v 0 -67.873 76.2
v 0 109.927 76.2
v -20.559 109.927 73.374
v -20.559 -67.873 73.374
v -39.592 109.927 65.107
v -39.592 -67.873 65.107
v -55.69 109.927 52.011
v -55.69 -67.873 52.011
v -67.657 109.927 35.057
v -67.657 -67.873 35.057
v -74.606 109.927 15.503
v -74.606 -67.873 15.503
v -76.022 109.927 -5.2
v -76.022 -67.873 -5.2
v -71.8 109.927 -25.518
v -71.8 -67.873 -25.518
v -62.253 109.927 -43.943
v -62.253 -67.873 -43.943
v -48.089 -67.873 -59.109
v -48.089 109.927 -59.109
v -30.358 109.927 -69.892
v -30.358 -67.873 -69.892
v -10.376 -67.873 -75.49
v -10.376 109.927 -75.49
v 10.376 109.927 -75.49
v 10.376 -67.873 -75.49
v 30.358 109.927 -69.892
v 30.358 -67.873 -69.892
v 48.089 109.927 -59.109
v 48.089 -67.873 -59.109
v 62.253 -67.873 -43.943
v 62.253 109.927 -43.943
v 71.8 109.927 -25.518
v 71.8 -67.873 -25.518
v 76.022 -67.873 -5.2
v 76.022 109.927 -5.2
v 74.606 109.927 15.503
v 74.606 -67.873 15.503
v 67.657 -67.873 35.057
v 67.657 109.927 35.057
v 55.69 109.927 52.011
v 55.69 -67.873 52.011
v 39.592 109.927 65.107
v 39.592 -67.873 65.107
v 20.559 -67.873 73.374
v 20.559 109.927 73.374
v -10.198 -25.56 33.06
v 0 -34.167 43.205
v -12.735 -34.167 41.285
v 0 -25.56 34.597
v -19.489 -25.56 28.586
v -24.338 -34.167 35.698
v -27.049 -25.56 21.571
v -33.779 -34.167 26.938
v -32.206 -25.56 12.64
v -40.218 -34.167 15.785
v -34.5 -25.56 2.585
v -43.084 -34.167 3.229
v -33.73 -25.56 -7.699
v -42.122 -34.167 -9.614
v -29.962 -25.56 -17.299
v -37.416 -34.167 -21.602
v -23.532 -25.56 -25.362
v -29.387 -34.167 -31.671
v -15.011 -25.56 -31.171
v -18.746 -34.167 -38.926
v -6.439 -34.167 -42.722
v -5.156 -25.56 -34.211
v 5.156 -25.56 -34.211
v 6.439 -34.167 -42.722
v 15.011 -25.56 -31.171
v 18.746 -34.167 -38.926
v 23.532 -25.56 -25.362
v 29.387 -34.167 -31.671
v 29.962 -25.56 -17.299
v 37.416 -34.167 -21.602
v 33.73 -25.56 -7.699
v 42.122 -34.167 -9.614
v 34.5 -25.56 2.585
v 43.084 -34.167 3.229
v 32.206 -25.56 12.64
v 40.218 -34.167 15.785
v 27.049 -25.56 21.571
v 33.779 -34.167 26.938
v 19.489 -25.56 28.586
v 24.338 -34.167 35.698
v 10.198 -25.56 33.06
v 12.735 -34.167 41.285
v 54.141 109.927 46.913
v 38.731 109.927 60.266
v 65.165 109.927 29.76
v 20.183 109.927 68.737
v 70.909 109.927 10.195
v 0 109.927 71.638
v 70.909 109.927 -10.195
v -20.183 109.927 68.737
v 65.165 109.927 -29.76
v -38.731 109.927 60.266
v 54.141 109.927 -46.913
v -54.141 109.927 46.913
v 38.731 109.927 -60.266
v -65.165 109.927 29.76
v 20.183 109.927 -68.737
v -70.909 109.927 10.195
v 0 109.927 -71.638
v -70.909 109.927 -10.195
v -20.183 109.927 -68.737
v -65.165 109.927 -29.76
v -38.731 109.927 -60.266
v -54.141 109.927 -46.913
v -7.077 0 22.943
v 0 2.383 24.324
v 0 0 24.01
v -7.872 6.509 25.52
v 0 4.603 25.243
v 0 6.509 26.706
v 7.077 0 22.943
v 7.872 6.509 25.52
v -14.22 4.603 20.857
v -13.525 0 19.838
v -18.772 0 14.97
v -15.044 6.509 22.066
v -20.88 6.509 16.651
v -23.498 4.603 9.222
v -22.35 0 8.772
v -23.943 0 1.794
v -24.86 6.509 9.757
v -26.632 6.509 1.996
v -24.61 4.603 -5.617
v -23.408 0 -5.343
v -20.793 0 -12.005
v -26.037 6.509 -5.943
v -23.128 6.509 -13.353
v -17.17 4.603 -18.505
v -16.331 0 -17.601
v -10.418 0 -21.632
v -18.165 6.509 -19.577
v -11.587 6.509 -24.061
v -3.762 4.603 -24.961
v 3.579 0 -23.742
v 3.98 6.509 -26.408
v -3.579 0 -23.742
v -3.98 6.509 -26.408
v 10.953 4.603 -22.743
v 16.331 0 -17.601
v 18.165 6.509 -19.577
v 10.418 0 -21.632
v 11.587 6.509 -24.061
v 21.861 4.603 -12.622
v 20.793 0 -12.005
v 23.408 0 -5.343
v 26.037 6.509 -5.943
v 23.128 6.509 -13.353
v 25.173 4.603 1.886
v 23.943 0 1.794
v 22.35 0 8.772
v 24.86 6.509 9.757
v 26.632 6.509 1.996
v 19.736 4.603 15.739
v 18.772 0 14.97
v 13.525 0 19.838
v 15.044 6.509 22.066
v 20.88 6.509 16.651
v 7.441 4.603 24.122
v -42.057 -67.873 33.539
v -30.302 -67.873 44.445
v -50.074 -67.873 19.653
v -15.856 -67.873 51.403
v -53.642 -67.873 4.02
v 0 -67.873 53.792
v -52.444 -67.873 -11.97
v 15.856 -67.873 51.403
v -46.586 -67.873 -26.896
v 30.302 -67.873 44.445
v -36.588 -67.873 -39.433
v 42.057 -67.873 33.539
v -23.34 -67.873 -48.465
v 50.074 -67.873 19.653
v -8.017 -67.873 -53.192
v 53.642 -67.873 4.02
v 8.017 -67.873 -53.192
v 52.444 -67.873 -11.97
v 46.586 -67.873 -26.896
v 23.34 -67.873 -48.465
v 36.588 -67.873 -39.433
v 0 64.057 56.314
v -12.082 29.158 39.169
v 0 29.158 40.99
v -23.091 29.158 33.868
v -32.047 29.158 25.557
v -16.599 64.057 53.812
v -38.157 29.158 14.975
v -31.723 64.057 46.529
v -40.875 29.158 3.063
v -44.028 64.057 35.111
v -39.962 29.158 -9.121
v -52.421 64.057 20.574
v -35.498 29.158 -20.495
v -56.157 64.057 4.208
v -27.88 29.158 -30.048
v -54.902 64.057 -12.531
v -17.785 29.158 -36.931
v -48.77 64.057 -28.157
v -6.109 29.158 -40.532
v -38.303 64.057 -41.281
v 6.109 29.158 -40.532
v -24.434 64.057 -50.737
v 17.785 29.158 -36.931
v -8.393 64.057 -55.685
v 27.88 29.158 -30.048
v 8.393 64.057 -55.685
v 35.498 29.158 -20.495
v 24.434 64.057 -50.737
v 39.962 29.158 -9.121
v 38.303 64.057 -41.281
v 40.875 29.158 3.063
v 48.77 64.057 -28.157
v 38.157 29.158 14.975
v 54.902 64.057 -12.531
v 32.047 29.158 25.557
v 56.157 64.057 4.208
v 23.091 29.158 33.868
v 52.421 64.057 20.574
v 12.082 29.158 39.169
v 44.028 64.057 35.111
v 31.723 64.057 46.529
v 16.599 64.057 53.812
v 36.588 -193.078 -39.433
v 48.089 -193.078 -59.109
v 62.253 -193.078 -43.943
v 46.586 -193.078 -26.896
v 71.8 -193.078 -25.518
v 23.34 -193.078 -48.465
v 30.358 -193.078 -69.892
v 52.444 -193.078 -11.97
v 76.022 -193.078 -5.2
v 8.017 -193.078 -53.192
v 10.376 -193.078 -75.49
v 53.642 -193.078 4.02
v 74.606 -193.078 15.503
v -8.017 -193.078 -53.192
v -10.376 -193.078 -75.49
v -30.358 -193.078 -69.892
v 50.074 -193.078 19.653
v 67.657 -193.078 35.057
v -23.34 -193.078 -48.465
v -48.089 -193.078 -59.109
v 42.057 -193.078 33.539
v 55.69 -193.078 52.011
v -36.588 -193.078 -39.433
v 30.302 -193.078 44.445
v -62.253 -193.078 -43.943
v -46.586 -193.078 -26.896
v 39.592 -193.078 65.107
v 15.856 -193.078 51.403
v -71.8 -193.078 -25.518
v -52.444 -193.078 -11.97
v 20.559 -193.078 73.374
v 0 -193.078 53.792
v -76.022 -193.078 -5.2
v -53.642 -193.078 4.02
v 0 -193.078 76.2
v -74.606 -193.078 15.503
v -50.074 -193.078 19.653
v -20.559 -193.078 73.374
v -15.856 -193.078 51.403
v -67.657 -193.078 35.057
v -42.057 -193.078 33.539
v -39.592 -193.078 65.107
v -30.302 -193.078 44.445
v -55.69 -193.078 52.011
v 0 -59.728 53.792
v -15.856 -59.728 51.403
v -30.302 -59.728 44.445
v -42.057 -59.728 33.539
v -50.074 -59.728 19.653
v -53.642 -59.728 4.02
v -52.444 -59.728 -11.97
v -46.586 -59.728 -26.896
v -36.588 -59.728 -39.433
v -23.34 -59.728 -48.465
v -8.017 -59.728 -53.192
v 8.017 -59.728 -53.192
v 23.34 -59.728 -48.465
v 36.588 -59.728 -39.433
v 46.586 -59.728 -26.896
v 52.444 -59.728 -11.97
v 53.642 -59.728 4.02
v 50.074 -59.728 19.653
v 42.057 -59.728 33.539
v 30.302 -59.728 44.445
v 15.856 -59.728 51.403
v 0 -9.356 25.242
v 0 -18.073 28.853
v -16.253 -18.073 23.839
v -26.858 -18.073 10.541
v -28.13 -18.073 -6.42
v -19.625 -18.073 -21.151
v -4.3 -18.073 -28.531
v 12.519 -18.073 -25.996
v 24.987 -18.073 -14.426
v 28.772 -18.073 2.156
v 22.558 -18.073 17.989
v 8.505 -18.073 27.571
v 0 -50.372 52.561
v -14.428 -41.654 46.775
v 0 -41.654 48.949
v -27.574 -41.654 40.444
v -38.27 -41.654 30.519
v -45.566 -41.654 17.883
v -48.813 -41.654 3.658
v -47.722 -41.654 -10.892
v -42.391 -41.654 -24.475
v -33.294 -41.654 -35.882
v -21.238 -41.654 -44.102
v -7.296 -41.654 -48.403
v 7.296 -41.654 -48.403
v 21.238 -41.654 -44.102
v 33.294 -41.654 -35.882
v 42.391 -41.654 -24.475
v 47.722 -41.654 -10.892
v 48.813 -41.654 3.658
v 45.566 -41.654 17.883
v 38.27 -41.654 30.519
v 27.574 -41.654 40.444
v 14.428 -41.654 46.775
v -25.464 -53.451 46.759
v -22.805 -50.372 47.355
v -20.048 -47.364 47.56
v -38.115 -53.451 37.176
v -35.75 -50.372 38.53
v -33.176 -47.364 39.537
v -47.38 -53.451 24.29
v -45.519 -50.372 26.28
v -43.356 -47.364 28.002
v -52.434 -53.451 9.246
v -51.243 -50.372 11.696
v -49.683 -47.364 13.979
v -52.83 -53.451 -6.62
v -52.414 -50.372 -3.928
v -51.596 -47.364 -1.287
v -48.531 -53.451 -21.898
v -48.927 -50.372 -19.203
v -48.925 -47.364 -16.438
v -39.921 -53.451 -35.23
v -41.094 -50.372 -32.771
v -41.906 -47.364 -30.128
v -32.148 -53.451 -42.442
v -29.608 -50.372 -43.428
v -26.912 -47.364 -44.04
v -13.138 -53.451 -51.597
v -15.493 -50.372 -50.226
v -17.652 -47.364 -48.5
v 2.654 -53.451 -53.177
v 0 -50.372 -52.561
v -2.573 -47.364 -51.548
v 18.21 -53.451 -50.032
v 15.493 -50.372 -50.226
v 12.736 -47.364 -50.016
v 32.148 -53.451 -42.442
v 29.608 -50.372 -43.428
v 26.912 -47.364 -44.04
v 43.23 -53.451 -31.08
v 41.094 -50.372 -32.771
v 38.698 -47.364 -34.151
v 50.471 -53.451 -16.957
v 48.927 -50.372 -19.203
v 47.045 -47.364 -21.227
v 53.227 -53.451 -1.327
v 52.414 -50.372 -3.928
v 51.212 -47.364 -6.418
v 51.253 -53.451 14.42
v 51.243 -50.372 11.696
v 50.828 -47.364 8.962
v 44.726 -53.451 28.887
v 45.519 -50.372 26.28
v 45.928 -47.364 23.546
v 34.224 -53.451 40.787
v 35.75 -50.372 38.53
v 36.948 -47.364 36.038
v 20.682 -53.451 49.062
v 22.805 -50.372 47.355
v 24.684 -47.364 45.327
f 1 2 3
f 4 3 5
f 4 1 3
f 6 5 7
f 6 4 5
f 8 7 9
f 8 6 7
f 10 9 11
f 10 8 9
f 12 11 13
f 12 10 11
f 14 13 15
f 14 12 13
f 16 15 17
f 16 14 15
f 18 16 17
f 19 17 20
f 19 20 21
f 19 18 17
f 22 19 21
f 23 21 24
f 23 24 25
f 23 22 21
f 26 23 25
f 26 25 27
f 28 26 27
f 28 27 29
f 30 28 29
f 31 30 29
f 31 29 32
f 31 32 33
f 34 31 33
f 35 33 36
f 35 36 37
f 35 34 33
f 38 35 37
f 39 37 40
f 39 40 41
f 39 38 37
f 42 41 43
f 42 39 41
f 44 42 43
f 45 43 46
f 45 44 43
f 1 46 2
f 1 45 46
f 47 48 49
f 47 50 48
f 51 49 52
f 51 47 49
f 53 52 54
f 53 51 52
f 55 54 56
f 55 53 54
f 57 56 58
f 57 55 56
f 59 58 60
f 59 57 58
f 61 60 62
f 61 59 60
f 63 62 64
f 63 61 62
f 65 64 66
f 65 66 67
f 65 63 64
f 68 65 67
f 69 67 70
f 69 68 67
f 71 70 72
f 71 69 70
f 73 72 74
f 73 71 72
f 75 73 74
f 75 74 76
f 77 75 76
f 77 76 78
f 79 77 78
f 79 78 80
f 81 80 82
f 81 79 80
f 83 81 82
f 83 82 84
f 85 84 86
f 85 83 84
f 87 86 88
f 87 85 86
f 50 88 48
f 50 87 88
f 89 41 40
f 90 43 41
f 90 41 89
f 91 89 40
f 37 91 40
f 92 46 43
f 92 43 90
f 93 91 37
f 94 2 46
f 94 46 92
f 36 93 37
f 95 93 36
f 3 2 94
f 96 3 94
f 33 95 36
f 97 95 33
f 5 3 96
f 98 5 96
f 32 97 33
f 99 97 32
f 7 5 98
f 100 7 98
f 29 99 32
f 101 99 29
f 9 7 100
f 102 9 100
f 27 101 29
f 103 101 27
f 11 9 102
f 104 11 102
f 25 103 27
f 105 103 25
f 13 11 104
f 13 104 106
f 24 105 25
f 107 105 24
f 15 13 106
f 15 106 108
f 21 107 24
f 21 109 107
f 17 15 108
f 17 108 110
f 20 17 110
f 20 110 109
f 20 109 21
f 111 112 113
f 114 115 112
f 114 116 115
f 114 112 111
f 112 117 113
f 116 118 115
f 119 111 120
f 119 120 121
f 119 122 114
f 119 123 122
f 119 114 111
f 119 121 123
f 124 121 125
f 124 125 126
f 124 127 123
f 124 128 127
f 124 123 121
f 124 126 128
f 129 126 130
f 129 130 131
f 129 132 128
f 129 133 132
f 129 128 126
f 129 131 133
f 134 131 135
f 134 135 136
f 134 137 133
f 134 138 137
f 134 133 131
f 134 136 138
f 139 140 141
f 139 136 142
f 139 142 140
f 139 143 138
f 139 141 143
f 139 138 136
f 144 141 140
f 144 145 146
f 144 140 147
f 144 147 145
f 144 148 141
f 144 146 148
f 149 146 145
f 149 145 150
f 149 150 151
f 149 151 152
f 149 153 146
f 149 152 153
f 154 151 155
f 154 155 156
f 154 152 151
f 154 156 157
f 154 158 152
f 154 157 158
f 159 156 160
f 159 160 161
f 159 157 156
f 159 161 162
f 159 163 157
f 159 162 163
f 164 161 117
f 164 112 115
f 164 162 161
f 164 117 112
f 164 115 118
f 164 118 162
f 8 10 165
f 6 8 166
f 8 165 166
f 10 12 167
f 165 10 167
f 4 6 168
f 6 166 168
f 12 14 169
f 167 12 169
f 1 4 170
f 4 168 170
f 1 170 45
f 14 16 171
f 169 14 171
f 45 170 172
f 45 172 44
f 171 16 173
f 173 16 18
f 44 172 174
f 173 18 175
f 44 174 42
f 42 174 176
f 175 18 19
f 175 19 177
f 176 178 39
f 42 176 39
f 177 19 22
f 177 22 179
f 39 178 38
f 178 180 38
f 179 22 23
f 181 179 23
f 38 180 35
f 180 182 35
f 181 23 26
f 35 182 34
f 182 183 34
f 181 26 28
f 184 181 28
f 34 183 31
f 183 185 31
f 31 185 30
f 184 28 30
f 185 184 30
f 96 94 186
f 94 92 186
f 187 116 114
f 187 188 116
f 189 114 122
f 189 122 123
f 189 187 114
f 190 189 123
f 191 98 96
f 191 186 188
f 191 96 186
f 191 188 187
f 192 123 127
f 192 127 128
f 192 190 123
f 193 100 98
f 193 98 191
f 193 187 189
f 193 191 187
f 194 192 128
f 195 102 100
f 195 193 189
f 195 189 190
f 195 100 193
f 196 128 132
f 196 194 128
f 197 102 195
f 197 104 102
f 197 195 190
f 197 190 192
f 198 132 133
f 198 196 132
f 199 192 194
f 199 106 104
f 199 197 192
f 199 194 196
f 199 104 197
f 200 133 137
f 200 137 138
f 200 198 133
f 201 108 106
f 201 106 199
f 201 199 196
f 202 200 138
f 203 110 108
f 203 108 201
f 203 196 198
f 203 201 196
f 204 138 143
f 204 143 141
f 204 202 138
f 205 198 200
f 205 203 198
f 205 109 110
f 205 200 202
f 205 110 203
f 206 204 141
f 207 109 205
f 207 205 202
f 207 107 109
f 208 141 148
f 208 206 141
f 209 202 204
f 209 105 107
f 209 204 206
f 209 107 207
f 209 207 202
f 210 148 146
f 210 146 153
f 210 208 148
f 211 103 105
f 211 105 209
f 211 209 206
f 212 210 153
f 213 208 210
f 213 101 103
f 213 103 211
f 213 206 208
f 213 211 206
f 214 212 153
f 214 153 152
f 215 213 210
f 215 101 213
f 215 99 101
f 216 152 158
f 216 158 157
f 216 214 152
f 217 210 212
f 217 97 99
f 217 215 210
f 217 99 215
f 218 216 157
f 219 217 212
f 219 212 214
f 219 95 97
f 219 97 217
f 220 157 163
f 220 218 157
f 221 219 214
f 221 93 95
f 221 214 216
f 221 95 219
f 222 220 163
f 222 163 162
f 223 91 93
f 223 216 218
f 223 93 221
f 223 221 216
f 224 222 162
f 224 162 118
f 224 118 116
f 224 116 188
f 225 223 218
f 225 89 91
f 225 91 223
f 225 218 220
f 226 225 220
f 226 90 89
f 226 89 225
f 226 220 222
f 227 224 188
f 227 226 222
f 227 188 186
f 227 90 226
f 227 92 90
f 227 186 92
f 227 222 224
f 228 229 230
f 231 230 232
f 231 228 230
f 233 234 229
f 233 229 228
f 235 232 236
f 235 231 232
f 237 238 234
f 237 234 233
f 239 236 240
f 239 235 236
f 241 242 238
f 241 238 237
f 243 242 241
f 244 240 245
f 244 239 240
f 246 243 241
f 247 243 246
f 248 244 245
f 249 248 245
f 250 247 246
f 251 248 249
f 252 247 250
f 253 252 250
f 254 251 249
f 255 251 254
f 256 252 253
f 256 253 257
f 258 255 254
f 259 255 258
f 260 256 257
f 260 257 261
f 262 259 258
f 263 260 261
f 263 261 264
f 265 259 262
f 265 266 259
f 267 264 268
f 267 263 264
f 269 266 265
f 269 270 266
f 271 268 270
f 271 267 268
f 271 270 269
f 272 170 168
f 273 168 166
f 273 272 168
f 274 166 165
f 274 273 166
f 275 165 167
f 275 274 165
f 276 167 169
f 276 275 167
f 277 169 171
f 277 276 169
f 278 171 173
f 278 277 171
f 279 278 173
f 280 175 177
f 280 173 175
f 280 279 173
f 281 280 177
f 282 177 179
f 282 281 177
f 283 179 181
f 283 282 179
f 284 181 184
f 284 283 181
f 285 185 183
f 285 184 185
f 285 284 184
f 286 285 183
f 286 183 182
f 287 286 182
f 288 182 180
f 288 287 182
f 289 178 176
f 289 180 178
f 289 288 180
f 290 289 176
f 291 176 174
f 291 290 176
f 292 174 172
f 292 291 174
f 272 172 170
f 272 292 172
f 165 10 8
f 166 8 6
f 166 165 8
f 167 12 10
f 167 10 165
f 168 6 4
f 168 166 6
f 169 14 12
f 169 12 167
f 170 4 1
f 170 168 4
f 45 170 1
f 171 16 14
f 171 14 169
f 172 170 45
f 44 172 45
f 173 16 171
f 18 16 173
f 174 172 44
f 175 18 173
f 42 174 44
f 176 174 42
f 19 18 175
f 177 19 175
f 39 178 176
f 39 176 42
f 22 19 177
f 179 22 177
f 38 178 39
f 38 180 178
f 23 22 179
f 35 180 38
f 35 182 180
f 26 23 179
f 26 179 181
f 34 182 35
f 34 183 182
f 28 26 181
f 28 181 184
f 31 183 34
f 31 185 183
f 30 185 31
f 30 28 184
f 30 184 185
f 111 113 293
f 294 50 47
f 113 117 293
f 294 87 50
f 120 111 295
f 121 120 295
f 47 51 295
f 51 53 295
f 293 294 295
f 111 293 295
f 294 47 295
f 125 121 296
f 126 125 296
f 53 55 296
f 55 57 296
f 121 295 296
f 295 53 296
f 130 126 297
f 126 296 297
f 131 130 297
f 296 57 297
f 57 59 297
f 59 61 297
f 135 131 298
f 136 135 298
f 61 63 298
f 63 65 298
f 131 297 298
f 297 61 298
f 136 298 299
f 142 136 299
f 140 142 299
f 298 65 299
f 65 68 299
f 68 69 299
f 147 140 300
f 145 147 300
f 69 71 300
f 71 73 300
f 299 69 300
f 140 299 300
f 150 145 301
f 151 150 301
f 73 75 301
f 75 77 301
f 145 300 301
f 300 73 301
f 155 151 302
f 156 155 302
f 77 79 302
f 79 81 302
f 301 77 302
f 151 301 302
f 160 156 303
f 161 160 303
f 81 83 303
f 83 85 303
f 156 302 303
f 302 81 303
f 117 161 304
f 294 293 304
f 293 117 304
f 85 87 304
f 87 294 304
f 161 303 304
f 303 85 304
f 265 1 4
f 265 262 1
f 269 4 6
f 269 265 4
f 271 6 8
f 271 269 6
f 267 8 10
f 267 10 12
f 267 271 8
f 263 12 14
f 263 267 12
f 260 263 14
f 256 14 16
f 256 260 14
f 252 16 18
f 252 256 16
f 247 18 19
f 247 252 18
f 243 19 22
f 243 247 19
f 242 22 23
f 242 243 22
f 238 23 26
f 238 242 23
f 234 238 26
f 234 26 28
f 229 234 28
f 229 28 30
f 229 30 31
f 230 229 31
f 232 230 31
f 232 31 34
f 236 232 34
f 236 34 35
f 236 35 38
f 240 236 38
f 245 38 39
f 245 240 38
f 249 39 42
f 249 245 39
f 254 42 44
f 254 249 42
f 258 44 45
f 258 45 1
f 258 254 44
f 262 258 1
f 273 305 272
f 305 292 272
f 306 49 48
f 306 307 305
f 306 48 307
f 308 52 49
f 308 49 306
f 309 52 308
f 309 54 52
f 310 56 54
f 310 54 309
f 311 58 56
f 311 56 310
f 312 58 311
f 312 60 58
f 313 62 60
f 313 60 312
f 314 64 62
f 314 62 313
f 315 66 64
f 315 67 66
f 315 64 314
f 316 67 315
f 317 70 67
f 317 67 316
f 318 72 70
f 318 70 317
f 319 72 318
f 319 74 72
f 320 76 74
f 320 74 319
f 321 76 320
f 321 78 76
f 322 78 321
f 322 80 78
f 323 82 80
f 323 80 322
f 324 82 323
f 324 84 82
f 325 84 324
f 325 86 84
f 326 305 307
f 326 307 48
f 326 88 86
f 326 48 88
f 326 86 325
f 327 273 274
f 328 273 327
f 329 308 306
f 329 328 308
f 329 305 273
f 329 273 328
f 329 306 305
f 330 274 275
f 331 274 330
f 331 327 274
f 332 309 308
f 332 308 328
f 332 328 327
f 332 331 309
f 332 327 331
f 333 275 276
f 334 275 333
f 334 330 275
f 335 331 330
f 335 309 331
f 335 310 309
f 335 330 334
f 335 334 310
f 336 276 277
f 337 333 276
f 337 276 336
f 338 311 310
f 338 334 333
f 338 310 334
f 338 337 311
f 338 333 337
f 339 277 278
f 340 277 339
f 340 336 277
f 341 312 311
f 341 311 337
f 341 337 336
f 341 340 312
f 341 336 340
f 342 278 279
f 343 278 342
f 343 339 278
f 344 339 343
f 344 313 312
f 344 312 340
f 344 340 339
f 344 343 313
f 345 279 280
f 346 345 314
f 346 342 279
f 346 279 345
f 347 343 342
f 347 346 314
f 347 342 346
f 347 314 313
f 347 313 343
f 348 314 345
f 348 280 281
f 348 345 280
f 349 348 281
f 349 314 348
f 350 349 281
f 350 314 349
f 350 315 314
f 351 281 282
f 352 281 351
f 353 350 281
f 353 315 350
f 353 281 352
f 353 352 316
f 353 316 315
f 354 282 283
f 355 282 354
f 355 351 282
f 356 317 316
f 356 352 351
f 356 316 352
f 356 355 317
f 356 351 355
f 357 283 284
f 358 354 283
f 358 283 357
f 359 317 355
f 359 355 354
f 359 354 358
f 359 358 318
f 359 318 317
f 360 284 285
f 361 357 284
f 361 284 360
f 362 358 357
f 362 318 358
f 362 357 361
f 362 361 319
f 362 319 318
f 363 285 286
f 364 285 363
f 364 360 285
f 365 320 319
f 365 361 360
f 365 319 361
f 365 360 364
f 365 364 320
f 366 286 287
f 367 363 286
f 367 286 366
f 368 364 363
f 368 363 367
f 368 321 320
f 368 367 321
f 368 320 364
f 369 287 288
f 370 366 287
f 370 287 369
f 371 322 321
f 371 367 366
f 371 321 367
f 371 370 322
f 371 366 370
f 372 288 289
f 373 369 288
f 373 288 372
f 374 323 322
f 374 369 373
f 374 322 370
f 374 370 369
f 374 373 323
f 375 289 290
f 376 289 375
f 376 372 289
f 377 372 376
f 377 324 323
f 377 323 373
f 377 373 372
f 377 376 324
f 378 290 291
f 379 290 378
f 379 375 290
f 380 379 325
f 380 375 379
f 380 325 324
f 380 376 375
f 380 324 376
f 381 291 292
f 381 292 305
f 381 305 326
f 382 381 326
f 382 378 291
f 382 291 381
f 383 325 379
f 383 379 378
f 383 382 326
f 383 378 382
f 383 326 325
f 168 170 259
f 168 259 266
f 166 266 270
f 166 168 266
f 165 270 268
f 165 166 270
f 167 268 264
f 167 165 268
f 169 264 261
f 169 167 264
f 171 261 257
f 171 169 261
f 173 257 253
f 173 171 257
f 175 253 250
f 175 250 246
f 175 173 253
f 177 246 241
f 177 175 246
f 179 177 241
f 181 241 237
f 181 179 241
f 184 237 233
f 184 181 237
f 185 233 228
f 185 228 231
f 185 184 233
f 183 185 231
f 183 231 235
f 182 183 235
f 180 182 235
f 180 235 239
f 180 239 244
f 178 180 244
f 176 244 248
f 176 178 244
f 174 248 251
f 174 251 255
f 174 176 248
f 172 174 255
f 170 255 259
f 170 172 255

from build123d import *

# Parameters (mm, degrees)
SHORTEN_CHAMBER_75IN_BY = 19.05
SPLIT1_SURFACE_1_BACK   = 372.838
SPLIT1_SURFACE_1_DEPTH  = 745.676
SPLIT1_SURFACE_2_BACK   = 372.838
SPLIT1_SURFACE_2_DEPTH  = 745.676


with BuildPart() as part:
    # Sketch1 → Revolve2 (revolve)
    with BuildSketch(Plane.XY, mode=Mode.PRIVATE) as revolve2_sk:
        with BuildLine():
            Line((71.638455479, 109.927347077), (76.2, 109.927347077))
            Line((76.2, 109.927347077), (76.2, -212.127673706))
            Line((76.2, -212.127673706), (53.792460243, -212.127673706))
            Line((53.792460243, -212.127673706), (53.792460243, -59.727673706))
            add(Edge.make_bspline(
                [(53.792460243, -59.727673706), (53.79245901, -59.657143635), (53.791929865, -59.515566582), (53.78955401, -59.181725095), (53.783229407, -58.904955972), (53.773743915, -58.532727967), (53.761101012, -58.212998101), (53.741350178, -57.781754922), (53.71133783, -57.281120379), (53.667125658, -56.688158646), (53.588220976, -55.848640848), (53.488359374, -55.008326344), (53.367608286, -54.172595915), (53.197743308, -53.172585727), (53.002996658, -52.177603312), (52.777307577, -51.188699577), (52.520946667, -50.207649536), (52.240221768, -49.233238242), (51.935281153, -48.26612973), (51.544470229, -47.149295579), (51.05045274, -45.890568924), (50.509666114, -44.65112933), (49.922993271, -43.432862061), (49.291052557, -42.237253783), (48.615057538, -41.066315433), (47.895407812, -39.921133222), (47.134034414, -38.804236815), (46.430801323, -37.851612371), (45.804470188, -37.055832718), (45.263749922, -36.403541885), (44.826059182, -35.894408242), (44.425708417, -35.447153273), (44.092389725, -35.084791805), (43.784856841, -34.760500776), (43.585004621, -34.551710078), (43.355324283, -34.318676919), (43.25471536, -34.217322688), (43.204843213, -34.167450302)],
                knots=[0.082637729, 0.082637729, 0.082637729, 0.082637729, 0.082637729, 0.092574926, 0.102512123, 0.11244932, 0.122386517, 0.132323714, 0.142260911, 0.162135305, 0.182009699, 0.201884093, 0.24163288, 0.261507274, 0.281381668, 0.321130456, 0.360879243, 0.380753637, 0.400628031, 0.440376819, 0.480125606, 0.519874394, 0.559623181, 0.599371969, 0.639120757, 0.678869544, 0.718618332, 0.75836712, 0.798115907, 0.817990301, 0.837864695, 0.857739089, 0.877613483, 0.88755068, 0.897487877, 0.907425074, 0.91736227, 0.91736227, 0.91736227, 0.91736227, 0.91736227], degree=4))
            Line((43.204843213, -34.167450302), (34.597215016, -25.559822106))
            add(Edge.make_bspline(
                [(24.01, 0), (24.010001231, -0.070528647), (24.010530378, -0.21358419), (24.012906065, -0.543182916), (24.01923046, -0.824160397), (24.028715582, -1.194822072), (24.041357876, -1.513435058), (24.0571581, -1.861939603), (24.07611336, -2.193706872), (24.103750975, -2.6180694), (24.143219184, -3.122033947), (24.214231846, -3.879978675), (24.33405882, -4.886450388), (24.51041819, -6.05671076), (24.761817384, -7.385166414), (25.062727469, -8.703574513), (25.412702783, -10.009637207), (25.811293148, -11.301819595), (26.25787756, -12.578099333), (26.751935496, -13.836887481), (27.292605299, -15.076197125), (27.879411568, -16.29460979), (28.511071583, -17.489938789), (29.187464585, -18.661287751), (29.906377295, -19.80574339), (30.668954196, -20.923860067), (31.370099393, -21.874411752), (31.999668326, -22.673445472), (32.535060622, -23.320422129), (32.983187975, -23.840005007), (33.419382235, -24.329816236), (33.846758332, -24.788484379), (34.156490851, -25.113868299), (34.44779217, -25.409649035), (34.547344638, -25.509949921), (34.597215016, -25.559822106)],
                knots=[0.082637729, 0.082637729, 0.082637729, 0.082637729, 0.082637729, 0.092574926, 0.102512123, 0.11244932, 0.122386517, 0.132323714, 0.142260911, 0.152198108, 0.162135305, 0.182009699, 0.201884093, 0.24163288, 0.281381668, 0.321130456, 0.360879243, 0.400628031, 0.440376819, 0.480125606, 0.519874394, 0.559623181, 0.599371969, 0.639120757, 0.678869544, 0.718618332, 0.75836712, 0.798115907, 0.817990301, 0.837864695, 0.857739089, 0.877613483, 0.897487877, 0.907425074, 0.91736227, 0.91736227, 0.91736227, 0.91736227, 0.91736227], degree=4))
            add(Edge.make_bspline(
                [(24.01, 0), (24.010000626, 0.035892652), (24.010538457, 0.11011369), (24.012955849, 0.267641069), (24.019393694, 0.427064117), (24.031465725, 0.646764266), (24.052367213, 0.901433328), (24.086116845, 1.202537273), (24.137431431, 1.542050498), (24.201475827, 1.880996777), (24.278073727, 2.21635442), (24.367255697, 2.549239421), (24.468673539, 2.878092645), (24.582551197, 3.203347041), (24.708128897, 3.523627157), (24.846218103, 3.839666733), (24.995002427, 4.149282184), (25.156944348, 4.454783123), (25.327420631, 4.751301575), (25.513446847, 5.045703861), (25.702720396, 5.325518936), (25.9153376, 5.610727543), (26.0898085, 5.832913647), (26.277277882, 6.049951637), (26.415487374, 6.208641646), (26.581374196, 6.382121779), (26.655452387, 6.458478841), (26.706211329, 6.50923965)],
                knots=[0.082568816, 0.082568816, 0.082568816, 0.082568816, 0.082568816, 0.102426634, 0.122284453, 0.142142271, 0.162000089, 0.201715725, 0.241431362, 0.281146998, 0.320862634, 0.360578271, 0.400293907, 0.440009544, 0.47972518, 0.519440816, 0.559156453, 0.598872089, 0.638587725, 0.678303362, 0.718018998, 0.757734635, 0.797450271, 0.837165907, 0.857023726, 0.876881544, 0.91659718, 0.91659718, 0.91659718, 0.91659718, 0.91659718], degree=4))
            add(Edge.make_bspline(
                [(26.706211329, 6.50923965), (49.172333461, 34.635954224), (71.638455479, 109.927347077)],
                knots=[0, 0, 0, 1, 1, 1], degree=2))
        make_face()
    revolve(revolve2_sk.sketch.rotate(Axis((0, 0, 0), (0, -1, 0)), 90), axis=Axis((0, 0, 0), (0, -1, 0)))

    # shorten_chamber_.75in: a face moved inward by 19.05
    extrude(part.faces().sort_by_distance((60.96, -212.127673706, 0))[0], amount=SHORTEN_CHAMBER_75IN_BY, dir=(0, 1, 0), mode=Mode.SUBTRACT)


with BuildPart() as body_2:
    # Split1: the piece behind the surface
    add(part.part)
    # Split1 surface: a surface, the sketch's curves swept straight by 745.676 mm
    with BuildLine(Plane.XY.offset(-SPLIT1_SURFACE_1_BACK), mode=Mode.PRIVATE) as split1_surface_1_path:
        Line((-76.2, -67.872652923), (76.2, -67.872652923))
    split1_surface_1 = Shell.extrude(split1_surface_1_path.wire(), (0 * SPLIT1_SURFACE_1_DEPTH, 0 * SPLIT1_SURFACE_1_DEPTH, 1 * SPLIT1_SURFACE_1_DEPTH))
    split(bisect_by=split1_surface_1, keep=Keep.BOTTOM)


with BuildPart() as part_1:
    add(part.part)

    # Split1: split by a surface, the side it looks to stays
    # Split1 surface: a surface, the sketch's curves swept straight by 745.676 mm
    with BuildLine(Plane.XY.offset(-SPLIT1_SURFACE_2_BACK), mode=Mode.PRIVATE) as split1_surface_2_path:
        Line((-76.2, -67.872652923), (76.2, -67.872652923))
    split1_surface_2 = Shell.extrude(split1_surface_2_path.wire(), (0 * SPLIT1_SURFACE_2_DEPTH, 0 * SPLIT1_SURFACE_2_DEPTH, 1 * SPLIT1_SURFACE_2_DEPTH))
    split(bisect_by=split1_surface_2, keep=Keep.TOP)


solid = Compound([body_2.part, part_1.part])
